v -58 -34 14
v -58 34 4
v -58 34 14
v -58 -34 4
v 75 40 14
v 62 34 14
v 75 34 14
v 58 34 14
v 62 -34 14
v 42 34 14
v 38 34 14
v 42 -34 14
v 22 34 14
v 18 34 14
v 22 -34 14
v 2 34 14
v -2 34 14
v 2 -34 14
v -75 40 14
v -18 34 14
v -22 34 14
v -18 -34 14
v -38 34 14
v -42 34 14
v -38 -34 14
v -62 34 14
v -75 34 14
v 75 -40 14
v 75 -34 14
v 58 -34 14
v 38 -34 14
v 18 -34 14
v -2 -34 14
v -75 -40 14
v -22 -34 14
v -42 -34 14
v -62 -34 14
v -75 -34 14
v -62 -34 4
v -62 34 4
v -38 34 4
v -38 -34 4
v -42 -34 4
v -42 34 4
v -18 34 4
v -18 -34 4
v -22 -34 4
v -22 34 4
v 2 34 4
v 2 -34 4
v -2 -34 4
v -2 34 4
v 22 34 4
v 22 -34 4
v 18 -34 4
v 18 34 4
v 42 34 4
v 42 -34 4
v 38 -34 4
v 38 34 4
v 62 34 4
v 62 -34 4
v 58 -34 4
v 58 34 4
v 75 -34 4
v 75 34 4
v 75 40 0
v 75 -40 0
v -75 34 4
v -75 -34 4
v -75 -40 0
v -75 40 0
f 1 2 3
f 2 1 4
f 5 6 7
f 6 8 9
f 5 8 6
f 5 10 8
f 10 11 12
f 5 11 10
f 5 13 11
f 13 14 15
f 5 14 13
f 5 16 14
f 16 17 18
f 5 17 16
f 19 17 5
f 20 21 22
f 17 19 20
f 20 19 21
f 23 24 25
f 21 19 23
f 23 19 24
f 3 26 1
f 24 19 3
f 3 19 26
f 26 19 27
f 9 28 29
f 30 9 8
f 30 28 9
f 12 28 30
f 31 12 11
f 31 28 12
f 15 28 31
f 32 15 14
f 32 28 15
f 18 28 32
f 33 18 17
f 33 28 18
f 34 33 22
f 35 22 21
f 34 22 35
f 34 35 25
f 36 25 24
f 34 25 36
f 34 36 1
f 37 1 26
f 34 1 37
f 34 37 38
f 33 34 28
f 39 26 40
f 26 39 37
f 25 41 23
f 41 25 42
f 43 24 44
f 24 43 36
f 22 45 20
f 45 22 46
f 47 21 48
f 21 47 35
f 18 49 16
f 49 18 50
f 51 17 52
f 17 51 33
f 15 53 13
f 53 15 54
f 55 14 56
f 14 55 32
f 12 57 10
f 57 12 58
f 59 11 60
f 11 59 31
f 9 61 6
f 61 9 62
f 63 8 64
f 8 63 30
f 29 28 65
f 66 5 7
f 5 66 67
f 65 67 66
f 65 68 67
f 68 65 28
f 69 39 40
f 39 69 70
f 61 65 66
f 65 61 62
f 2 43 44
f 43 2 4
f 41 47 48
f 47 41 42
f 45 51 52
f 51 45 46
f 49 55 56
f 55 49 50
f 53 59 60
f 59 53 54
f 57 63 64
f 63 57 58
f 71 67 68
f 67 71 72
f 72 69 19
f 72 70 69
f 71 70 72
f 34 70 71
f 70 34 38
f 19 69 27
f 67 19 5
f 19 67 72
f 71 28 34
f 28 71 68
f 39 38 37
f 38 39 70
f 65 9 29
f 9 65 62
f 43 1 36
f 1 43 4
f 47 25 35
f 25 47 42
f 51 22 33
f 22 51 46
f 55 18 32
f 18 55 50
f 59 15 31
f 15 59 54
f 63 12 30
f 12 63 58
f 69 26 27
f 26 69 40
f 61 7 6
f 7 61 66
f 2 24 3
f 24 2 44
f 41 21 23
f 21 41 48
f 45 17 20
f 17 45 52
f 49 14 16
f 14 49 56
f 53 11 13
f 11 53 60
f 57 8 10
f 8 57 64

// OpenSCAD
$fn = 32;

// ----------------------------------------------------------------------
// Rib frame 150 x 80 x 14
// 7 ribs at 20 mm pitch
// ----------------------------------------------------------------------

// --- parameters (mm) ---
frame = [150, 80, 4];  // base plate size (x, y, z)
rail_w = 6;            // side rail width
ribs = 7;              // number of ribs
rib_t = 4;             // rib thickness
rib_h = 10;            // rib height above the base plate
pitch = 20;            // pitch between rib centres

// --- derived feature positions (mm) ---
span = (ribs - 1) * pitch;          // = 120   distance between the outer ribs
origin_x = -span / 2;               // = -60   X of the first rib
rib_len = frame[1] - 2 * rail_w + 2;  // = 70   rib length, 1 mm into each rail
feature_centers = [
  [origin_x + 0 * pitch, 0],
  [origin_x + 1 * pitch, 0],
  [origin_x + 2 * pitch, 0],
  [origin_x + 3 * pitch, 0],
  [origin_x + 4 * pitch, 0],
  [origin_x + 5 * pitch, 0],
  [origin_x + 6 * pitch, 0]
];   // rib centre line, drives the rib loop

// base plate, two side rails, then the ribs read straight off feature_centers
union() {
  translate([-frame[0] / 2, -frame[1] / 2, 0]) cube(frame);
  translate([-frame[0] / 2, -frame[1] / 2, 0]) cube([frame[0], rail_w, frame[2] + rib_h]);
  translate([-frame[0] / 2, frame[1] / 2 - rail_w, 0]) cube([frame[0], rail_w, frame[2] + rib_h]);
  for (centre = feature_centers)
    translate([centre[0] - rib_t / 2, centre[1] - rib_len / 2, frame[2] - 1])
      cube([rib_t, rib_len, rib_h + 1]);
}
